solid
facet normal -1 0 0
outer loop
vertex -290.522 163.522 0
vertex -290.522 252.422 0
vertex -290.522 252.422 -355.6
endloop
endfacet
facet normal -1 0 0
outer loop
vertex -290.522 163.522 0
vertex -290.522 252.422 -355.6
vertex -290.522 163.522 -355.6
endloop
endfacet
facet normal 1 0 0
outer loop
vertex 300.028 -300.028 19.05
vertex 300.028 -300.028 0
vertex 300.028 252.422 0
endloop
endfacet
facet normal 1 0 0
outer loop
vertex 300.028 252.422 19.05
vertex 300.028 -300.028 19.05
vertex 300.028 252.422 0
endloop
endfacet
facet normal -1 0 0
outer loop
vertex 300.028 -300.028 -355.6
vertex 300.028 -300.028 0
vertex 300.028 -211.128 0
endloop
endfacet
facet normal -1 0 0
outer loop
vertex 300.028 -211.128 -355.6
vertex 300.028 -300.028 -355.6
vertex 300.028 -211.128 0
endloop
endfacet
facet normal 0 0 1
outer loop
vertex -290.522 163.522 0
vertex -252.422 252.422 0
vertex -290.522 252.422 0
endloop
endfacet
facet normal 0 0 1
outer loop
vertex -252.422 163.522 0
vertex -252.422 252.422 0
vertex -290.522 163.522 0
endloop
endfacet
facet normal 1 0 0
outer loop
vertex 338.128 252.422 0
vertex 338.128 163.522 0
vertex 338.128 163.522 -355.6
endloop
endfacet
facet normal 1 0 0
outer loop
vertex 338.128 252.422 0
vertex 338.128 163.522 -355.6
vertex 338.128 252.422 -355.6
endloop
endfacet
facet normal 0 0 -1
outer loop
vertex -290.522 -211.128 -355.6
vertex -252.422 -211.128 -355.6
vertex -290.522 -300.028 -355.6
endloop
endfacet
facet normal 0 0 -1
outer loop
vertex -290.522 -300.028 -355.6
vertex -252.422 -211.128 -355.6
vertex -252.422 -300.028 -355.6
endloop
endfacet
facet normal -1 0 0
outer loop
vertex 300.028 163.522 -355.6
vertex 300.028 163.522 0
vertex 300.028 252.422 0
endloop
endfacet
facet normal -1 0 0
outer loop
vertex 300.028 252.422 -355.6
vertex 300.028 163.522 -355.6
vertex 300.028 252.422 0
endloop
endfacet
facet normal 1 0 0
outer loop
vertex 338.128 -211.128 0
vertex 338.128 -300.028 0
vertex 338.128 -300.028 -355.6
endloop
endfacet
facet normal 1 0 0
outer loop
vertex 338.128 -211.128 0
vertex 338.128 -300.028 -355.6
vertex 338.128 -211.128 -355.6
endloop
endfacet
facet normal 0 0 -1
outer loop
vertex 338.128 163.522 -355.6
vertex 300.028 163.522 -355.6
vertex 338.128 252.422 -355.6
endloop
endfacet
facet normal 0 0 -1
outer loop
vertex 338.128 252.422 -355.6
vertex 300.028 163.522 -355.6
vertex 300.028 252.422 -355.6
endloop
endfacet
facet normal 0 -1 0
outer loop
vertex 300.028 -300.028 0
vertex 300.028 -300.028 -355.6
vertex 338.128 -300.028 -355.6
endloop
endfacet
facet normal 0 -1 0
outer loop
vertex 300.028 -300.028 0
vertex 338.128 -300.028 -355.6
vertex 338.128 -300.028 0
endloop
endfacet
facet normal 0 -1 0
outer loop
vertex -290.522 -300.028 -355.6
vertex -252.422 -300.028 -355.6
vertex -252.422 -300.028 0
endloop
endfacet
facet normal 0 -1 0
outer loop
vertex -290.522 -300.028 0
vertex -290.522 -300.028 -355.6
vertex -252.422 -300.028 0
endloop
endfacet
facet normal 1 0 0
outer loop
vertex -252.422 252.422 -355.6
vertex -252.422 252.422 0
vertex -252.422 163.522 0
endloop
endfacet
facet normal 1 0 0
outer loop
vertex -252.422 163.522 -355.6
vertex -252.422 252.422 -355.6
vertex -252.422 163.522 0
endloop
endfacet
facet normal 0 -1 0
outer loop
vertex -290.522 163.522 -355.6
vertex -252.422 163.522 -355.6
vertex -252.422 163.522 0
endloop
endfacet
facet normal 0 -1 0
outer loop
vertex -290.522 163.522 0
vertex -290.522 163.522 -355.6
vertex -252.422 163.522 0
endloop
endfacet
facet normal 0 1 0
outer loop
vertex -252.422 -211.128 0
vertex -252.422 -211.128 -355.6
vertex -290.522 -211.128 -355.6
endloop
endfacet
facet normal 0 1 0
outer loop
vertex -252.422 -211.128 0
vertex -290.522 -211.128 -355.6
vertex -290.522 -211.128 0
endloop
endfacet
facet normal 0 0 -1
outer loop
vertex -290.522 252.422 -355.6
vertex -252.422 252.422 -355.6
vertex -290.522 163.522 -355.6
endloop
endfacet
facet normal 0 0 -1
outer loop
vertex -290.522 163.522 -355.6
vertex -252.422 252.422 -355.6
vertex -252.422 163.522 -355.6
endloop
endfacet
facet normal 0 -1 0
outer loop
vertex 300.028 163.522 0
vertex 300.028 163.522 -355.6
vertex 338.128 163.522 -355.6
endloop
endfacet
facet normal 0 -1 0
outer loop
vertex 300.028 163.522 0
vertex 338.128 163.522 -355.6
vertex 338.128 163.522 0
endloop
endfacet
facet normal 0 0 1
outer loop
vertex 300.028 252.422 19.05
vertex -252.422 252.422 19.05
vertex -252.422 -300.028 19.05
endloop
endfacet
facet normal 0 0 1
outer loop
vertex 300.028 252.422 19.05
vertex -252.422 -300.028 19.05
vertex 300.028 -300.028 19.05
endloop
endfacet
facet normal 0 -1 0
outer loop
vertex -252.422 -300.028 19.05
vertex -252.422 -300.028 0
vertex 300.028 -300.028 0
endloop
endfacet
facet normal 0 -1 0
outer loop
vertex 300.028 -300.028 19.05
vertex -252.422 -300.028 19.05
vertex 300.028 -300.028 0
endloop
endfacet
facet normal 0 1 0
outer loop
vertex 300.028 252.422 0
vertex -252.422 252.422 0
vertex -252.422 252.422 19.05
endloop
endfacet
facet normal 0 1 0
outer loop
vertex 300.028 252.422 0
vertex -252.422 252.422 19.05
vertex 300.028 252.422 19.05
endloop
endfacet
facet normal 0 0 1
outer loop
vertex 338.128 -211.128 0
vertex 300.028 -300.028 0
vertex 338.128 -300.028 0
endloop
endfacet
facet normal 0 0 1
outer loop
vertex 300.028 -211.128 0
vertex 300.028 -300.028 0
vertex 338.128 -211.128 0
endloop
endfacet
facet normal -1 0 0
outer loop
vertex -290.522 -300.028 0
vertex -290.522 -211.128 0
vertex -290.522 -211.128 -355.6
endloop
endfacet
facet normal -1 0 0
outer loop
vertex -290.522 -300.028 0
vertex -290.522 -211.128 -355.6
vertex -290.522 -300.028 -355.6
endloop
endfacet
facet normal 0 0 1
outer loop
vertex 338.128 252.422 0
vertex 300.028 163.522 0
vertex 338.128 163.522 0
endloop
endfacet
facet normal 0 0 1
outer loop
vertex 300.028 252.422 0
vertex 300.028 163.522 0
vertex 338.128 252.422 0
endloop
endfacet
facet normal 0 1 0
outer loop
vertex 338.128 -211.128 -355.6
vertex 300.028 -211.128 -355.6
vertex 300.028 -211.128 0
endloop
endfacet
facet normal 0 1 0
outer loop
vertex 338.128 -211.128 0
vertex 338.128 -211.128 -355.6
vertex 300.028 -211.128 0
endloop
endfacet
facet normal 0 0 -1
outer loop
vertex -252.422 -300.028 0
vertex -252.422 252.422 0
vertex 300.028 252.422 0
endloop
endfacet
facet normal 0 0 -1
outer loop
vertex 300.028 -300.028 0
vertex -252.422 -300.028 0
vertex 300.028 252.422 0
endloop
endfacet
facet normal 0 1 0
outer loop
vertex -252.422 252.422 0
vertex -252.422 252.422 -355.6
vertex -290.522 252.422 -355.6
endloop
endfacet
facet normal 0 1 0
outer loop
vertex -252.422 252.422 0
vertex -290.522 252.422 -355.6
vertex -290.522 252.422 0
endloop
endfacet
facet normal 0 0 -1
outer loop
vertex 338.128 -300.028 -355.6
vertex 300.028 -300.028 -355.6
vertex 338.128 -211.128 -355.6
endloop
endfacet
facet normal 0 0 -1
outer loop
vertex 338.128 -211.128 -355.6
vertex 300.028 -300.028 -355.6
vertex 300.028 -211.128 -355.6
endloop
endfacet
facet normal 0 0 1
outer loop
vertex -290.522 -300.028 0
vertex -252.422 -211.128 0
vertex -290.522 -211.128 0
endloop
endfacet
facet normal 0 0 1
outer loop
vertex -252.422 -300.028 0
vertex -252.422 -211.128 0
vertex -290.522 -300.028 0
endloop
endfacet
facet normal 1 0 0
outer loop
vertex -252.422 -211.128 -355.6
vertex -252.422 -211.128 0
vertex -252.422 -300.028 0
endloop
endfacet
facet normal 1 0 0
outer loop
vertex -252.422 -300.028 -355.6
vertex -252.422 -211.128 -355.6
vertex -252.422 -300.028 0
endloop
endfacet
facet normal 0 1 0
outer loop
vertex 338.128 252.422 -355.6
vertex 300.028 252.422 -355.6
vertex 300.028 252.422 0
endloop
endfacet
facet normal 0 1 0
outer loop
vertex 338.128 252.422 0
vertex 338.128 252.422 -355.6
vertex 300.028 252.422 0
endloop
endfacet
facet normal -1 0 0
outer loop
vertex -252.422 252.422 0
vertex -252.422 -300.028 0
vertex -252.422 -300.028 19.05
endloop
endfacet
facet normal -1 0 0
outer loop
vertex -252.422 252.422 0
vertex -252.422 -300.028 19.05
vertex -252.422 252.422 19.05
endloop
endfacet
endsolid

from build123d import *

# Parameters (mm, degrees)
F0_W     = 552.45
F0_H     = 552.45
F1_DEPTH = 19.05
F2_W     = 88.9
F2_H     = 355.6
F3_DEPTH = 38.1
F4_W     = 88.9
F4_H     = 355.6
F5_DEPTH = 38.1


with BuildPart() as f1:
    # F0 (on Top) → F1 (new body)
    with BuildSketch(Plane.XY):
        with Locations((23.802608, -23.802608)):
            Rectangle(F0_W, F0_H)
    extrude(amount=F1_DEPTH)


with BuildPart() as f3:
    # F2 (on face) → F3 (new body)
    with BuildSketch(Plane.YZ.offset(300.027608)):
        with Locations((-255.577608, -177.8)):
            Rectangle(F2_W, F2_H)
        with Locations((207.972392, -177.8)):
            Rectangle(F2_W, F2_H)
    extrude(amount=F3_DEPTH)


with BuildPart() as f5:
    # F4 (on face) → F5 (new body)
    with BuildSketch(Plane(origin=(-252.422392, 0, 0), x_dir=(0, -1, 0), z_dir=(-1, 0, 0))):
        with Locations((-207.972392, -177.8)):
            Rectangle(F4_W, F4_H)
        with Locations((255.577608, -177.8)):
            Rectangle(F4_W, F4_H)
    extrude(amount=F5_DEPTH)


solid = Compound([f1.part, f3.part, f5.part])
